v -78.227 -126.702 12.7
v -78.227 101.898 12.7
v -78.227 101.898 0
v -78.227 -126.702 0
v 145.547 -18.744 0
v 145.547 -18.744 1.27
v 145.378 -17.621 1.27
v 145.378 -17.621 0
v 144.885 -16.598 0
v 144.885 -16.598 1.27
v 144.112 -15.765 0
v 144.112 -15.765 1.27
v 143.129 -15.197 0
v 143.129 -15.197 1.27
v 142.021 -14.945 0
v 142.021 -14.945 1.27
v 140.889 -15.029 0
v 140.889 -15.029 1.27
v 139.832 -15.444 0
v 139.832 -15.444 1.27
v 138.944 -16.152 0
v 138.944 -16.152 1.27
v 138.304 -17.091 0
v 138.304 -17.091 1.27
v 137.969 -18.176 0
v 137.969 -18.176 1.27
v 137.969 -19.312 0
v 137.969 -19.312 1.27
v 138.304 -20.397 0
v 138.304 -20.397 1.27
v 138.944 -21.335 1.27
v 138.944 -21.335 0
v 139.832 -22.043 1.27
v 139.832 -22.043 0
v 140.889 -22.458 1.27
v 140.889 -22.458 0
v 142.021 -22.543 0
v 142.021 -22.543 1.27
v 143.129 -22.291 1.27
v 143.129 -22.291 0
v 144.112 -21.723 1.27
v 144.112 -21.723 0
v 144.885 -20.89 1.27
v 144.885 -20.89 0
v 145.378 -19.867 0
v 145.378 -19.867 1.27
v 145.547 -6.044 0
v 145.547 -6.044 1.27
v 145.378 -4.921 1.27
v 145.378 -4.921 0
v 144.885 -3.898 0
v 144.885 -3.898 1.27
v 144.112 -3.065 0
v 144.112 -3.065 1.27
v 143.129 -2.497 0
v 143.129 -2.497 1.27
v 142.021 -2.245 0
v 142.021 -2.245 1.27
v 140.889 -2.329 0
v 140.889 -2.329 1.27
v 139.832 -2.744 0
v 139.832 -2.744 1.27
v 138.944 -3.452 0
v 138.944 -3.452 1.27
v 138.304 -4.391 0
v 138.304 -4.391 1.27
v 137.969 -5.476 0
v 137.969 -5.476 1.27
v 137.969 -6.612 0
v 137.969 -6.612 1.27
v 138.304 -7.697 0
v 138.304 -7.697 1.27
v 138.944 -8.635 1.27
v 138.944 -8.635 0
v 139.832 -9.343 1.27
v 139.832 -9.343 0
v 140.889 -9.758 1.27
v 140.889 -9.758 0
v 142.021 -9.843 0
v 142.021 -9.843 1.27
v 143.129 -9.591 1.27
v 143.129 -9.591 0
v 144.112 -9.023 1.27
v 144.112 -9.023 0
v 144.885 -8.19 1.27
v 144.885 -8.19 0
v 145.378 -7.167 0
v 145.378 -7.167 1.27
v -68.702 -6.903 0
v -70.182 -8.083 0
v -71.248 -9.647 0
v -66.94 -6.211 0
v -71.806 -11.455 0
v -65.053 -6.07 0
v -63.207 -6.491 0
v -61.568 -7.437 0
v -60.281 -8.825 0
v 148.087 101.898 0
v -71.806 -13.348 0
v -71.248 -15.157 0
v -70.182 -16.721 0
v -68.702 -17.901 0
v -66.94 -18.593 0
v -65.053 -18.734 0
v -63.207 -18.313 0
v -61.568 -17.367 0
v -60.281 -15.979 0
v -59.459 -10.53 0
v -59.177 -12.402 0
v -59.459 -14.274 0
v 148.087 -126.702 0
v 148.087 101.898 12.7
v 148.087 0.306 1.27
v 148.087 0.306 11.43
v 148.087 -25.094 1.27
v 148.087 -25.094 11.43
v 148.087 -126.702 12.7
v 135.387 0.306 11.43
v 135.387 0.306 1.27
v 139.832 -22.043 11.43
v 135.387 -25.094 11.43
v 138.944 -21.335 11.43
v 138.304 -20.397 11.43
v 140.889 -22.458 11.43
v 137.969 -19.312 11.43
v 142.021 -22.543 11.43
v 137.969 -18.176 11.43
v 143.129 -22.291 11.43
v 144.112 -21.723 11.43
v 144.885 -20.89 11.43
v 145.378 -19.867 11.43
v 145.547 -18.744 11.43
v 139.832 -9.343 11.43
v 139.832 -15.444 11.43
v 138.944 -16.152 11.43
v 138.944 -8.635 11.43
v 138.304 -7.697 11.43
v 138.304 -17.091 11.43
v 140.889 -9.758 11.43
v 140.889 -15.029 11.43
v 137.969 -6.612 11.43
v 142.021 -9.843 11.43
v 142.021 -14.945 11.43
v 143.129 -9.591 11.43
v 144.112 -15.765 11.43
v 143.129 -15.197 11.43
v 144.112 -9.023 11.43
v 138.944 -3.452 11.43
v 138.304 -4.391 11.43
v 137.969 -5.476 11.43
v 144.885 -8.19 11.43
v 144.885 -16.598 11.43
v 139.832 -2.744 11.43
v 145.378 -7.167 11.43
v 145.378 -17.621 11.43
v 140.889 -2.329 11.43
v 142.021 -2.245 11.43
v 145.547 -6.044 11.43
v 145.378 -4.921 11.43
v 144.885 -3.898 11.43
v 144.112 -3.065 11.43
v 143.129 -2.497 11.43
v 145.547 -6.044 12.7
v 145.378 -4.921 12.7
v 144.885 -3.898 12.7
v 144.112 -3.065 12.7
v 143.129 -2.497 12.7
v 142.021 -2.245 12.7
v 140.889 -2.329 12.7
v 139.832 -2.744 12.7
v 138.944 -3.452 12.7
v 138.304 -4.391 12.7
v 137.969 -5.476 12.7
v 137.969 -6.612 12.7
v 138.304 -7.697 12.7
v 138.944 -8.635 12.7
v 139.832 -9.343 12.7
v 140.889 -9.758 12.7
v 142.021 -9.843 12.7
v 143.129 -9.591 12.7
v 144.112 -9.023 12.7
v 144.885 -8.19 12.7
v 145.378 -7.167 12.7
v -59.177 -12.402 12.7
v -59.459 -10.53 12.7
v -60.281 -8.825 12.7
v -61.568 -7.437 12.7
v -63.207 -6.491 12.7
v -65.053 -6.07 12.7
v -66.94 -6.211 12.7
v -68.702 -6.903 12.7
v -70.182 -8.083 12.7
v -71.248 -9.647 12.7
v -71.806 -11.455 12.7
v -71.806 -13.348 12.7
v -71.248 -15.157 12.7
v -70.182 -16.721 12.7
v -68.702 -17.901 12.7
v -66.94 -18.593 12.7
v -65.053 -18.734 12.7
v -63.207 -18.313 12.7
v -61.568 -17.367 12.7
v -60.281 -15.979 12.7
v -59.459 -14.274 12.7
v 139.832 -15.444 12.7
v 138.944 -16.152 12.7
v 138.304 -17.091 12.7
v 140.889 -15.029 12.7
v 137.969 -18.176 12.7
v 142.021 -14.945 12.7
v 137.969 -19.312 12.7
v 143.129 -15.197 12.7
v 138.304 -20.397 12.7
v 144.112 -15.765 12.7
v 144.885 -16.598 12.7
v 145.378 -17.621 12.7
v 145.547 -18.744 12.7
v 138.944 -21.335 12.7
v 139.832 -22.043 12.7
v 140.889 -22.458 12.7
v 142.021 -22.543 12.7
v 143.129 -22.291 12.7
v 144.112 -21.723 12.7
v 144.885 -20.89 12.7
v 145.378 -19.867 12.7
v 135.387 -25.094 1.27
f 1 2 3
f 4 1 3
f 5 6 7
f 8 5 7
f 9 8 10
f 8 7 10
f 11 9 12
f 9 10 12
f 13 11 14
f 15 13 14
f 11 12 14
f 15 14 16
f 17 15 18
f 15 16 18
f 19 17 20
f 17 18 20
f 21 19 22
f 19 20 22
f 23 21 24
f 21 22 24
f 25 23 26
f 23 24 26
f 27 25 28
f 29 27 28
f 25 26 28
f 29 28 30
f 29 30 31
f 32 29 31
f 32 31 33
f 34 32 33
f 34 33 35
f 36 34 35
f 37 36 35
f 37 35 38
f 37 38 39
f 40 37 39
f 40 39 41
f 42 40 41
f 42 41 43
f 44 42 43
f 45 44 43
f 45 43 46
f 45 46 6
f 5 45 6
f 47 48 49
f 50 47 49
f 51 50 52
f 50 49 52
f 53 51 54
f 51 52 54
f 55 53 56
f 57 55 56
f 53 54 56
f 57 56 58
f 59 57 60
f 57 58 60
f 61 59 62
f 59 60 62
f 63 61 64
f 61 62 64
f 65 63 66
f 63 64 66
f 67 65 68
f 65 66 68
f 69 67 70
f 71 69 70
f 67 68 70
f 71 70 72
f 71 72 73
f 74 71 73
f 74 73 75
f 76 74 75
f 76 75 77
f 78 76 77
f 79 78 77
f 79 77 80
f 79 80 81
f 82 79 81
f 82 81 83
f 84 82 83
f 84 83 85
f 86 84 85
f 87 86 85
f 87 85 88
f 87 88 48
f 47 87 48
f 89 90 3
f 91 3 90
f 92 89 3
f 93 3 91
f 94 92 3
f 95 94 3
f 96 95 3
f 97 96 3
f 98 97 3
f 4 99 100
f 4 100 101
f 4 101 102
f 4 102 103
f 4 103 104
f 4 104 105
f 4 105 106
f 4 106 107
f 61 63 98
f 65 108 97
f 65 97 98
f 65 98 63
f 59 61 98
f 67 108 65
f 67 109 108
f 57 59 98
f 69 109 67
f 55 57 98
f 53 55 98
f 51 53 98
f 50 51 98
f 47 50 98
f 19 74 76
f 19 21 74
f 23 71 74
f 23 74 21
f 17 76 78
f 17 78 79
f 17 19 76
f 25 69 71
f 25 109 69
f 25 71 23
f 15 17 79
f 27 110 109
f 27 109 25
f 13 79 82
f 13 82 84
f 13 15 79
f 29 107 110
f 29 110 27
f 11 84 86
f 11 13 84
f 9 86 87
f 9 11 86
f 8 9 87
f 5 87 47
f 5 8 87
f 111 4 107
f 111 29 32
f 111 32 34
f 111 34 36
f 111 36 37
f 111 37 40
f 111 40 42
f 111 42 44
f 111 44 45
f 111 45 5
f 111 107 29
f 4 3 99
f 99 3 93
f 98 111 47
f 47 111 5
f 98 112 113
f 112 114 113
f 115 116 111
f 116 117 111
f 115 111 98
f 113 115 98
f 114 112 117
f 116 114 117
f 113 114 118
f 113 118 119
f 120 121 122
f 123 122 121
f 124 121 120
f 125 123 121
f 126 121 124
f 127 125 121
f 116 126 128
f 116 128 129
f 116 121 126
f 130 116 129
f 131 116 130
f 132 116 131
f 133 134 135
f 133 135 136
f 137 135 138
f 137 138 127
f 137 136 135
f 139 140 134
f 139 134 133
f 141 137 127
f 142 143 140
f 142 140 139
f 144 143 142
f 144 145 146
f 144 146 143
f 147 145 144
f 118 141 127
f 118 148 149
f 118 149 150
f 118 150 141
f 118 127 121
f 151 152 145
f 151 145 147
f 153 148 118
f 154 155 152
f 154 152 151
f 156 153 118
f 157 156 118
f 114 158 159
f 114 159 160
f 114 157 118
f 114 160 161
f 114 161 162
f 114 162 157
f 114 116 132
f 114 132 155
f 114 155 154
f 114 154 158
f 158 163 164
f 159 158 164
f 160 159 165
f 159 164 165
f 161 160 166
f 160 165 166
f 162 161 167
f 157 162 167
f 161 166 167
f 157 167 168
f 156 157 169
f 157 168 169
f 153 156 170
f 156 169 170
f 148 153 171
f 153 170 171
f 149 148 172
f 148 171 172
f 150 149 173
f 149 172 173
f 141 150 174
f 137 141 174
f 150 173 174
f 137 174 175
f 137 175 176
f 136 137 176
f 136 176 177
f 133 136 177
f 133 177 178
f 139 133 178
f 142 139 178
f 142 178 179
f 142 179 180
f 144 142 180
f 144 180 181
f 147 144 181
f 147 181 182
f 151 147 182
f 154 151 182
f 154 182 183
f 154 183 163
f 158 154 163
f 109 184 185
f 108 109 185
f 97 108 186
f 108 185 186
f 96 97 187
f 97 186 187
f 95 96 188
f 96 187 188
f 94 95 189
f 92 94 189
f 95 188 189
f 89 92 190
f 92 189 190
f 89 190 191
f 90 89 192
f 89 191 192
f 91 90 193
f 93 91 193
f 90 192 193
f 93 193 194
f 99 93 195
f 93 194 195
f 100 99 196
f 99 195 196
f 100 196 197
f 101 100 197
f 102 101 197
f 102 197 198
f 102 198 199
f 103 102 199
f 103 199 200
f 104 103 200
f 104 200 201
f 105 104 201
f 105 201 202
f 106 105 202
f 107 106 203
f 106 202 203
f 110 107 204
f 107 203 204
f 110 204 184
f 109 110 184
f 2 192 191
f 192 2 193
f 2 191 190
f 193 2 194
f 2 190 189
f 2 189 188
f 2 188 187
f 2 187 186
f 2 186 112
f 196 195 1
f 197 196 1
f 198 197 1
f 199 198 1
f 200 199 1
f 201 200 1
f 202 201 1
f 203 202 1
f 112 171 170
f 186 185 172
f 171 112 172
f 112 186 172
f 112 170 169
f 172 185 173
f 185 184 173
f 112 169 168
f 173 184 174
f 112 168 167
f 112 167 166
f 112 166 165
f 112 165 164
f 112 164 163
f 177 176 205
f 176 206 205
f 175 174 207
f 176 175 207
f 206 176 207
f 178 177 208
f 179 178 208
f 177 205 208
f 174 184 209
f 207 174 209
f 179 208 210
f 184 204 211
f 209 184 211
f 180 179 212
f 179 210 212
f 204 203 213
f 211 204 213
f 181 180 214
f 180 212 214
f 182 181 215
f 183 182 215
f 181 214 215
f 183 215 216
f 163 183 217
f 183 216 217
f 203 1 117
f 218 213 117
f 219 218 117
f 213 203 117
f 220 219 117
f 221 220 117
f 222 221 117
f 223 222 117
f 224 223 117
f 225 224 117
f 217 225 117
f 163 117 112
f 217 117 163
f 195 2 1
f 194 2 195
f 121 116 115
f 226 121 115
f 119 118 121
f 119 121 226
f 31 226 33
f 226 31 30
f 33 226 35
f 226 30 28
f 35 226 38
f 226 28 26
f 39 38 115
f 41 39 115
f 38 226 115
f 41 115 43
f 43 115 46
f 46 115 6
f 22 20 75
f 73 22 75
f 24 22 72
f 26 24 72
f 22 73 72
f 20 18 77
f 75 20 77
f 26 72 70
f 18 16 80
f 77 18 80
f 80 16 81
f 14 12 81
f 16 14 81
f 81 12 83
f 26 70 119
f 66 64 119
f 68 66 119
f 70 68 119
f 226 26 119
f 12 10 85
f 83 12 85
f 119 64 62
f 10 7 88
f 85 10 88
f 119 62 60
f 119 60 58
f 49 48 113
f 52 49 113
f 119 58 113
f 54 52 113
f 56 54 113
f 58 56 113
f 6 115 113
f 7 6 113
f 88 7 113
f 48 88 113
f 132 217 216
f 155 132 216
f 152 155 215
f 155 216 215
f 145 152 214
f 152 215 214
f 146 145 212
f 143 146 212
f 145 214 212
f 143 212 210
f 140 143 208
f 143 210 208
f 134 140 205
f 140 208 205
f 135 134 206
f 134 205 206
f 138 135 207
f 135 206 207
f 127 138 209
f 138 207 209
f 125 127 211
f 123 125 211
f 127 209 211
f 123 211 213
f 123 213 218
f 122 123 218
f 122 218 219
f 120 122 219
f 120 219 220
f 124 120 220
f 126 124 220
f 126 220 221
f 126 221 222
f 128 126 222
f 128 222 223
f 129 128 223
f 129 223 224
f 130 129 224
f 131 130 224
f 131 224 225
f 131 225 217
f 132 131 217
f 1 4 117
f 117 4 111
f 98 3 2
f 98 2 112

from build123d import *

# Parameters (mm, degrees)
SKETCH1_W           = 226.314
SKETCH1_H           = 215.9
BOSS_EXTRUDE1_DEPTH = 12.7
SKETCH2_W           = 10.16
SKETCH2_H           = 25.4
CUT_EXTRUDE1_DEPTH  = 12.7
SKETCH3_R           = 6.35
SKETCH3_R_2         = 3.81
CUT_EXTRUDE2_DEPTH  = 12.7
SKETCH4_W           = 226.314
SKETCH4_H           = 12.7
BOSS_EXTRUDE2_DEPTH = 12.7


with BuildPart() as part:
    # Sketch1 → Boss-Extrude1 (new body)
    with BuildSketch(Plane.XY):
        with Locations((34.929769953, -18.751877934)):
            Rectangle(SKETCH1_W, SKETCH1_H)
    extrude(amount=BOSS_EXTRUDE1_DEPTH)

    # Sketch2 → Cut-Extrude1 (cut)
    with BuildSketch(Plane(origin=(148.086769953, 0, 0), x_dir=(0, 0, -1), z_dir=(1, 0, 0))):
        with Locations((-6.35, -12.393940124)):
            Rectangle(SKETCH2_W, SKETCH2_H)
    extrude(amount=-CUT_EXTRUDE1_DEPTH, mode=Mode.SUBTRACT)

    # Sketch3 → Cut-Extrude2 (cut)
    with BuildSketch(Plane.XY.offset(12.7)):
        with Locations((-65.527230047, -12.401877934)):
            Circle(SKETCH3_R)
        with Locations((141.736769953, -6.043940124)):
            Circle(SKETCH3_R_2)
        with Locations((141.736769953, -18.743940124)):
            Circle(SKETCH3_R_2)
    extrude(amount=-CUT_EXTRUDE2_DEPTH, mode=Mode.SUBTRACT)

    # Sketch4 → Boss-Extrude2 (add)
    with BuildSketch(Plane(origin=(0, 89.198122066, 0), x_dir=(1, 0, 0), z_dir=(0, 1, 0))):
        with Locations((34.929769953, -6.35)):
            Rectangle(SKETCH4_W, SKETCH4_H)
    extrude(amount=BOSS_EXTRUDE2_DEPTH)


solid = part.part
